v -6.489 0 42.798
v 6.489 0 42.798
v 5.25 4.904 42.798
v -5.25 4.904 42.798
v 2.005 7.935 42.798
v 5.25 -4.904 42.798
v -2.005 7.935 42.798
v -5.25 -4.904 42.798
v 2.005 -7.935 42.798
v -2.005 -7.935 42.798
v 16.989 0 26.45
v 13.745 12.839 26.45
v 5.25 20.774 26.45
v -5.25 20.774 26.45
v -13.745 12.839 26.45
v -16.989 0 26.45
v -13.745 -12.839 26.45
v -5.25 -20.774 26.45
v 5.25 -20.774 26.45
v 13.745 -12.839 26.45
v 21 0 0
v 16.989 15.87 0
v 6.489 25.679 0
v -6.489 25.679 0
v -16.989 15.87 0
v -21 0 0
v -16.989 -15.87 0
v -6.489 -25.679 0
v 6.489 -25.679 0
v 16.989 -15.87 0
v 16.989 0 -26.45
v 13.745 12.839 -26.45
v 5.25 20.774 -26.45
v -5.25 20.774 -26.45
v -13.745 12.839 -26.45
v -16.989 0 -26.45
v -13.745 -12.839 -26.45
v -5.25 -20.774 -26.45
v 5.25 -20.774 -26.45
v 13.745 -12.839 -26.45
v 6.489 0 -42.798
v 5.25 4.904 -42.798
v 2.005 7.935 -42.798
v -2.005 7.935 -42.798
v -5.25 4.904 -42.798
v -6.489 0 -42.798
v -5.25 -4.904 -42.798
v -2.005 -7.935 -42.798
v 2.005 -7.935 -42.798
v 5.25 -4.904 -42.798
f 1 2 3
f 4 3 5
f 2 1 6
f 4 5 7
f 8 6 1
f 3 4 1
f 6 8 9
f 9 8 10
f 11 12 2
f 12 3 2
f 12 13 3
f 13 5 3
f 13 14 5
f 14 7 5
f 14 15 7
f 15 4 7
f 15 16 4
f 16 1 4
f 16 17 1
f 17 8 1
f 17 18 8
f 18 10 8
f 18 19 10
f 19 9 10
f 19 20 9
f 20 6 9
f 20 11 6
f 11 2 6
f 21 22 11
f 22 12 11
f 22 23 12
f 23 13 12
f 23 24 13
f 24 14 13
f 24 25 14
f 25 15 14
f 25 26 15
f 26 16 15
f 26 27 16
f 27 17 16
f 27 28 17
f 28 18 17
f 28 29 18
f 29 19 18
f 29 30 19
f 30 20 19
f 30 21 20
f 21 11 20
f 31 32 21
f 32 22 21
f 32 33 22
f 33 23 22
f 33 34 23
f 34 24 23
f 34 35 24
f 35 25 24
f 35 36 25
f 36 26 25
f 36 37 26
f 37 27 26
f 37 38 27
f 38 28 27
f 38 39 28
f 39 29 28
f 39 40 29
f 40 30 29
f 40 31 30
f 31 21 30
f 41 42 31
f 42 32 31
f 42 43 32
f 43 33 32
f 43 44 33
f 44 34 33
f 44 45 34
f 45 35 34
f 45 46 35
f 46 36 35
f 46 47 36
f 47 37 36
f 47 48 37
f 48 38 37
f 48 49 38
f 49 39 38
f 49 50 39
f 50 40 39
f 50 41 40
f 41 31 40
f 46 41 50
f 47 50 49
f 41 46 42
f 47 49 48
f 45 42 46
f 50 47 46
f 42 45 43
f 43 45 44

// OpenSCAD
// Generated by SolidPython 1.0.1 on 2020-07-29 00:46:47


scale(v = [7, 9, 15]) {
	sphere(r = 3);
}
/***********************************************
*********      SolidPython code:      **********
************************************************
 
# import packages: SolidPython
from solid import *
from solid.utils import *
from itertools import chain, combinations, permutations


class Resize:

    def __init__(self, scad_file):
        self.scad_file = scad_file
        #self.scad_file = import_scad(scad_file)
        # cone/cylinder param:
        self.r1 = 0
        self.r2 = 0
        self.h = 0
        # rectangular prism param:
        self.w = 0
        self.l = 0
        # ellipse param:
        self.r = 0

    # import OpenScad code (file name corresponds to shape)


    # classify shape + parameters
    def assign(self, param1, param2, param3):
        if self.scad_file == 'cone.scad':
            self.r1 = param1
            self.r2 = param2
            self.h = param3
        elif self.scad_file == 'cylinder.scad':
            self.r1 = param1
            self.r2 = param2
            self.h = param3
        elif self.scad_file == 'rectangularPrism.scad':
            self.h = param1
            self.l = param2
            self.w = param3
        else:
            self.r = param1
            self.h = param2

    # resize parameters
    def iterate(self):
        x = range(3, 20, 2)
        i = 1
        if self.scad_file == 'cone.scad':
            tempList = list(permutations(x, 2))
            for temp in tempList:
                param1 = temp[0]
                param2 = temp[1]
                filepath = 'produced_scad_files/' + 'cone' + str(param1) + '_' + str(param2) + '_' + '.scad'
                scad_render_to_file(cylinder(h=param1, r1=param2, r2=0), filepath)

        elif self.scad_file == 'cylinder.scad':
            tempList = list(permutations(x, 3))
            for temp in tempList:
                param1 = temp[0]
                param2 = temp[1]
                filepath = 'produced_scad_files/' + 'cylinder' + str(param1) + '_' + str(param2) + '_' + '.scad'
                scad_render_to_file(cylinder(h=param1, r1=param2, r2=param2), filepath)

        elif self.scad_file == 'rectangularPrism.scad':
            tempList = list(permutations(x, 3))
            for temp in tempList:
                param1 = temp[0]
                param2 = temp[1]
                param3 = temp[2]
                filepath = 'produced_scad_files/' + 'rectangularPrism' + str(param1) + '_' + str(param2) + '_' + str(
                    param3) + '.scad'
                scad_render_to_file(cube(size=(param1, param2, param3)), filepath)

        elif self.scad_file == 'ellipse.scad':
            tempList = list(permutations(x, 4))
            for temp in tempList:
                param1 = temp[0]
                param2 = temp[1]
                param3 = temp[2]
                param4 = temp[3]
                filepath = 'produced_scad_files/' + 'ellipse' + str(param1) + '_' + str(param2) + '_' + str(param3) + '_' + str(param4) + '.scad'
                scad_render_to_file(scale([param1, param2, param3])(sphere(r=param4)), filepath)

    def render_to_scadfile(self):
        scad_render_to_file(scad, 'example.scad') 
 
************************************************/
